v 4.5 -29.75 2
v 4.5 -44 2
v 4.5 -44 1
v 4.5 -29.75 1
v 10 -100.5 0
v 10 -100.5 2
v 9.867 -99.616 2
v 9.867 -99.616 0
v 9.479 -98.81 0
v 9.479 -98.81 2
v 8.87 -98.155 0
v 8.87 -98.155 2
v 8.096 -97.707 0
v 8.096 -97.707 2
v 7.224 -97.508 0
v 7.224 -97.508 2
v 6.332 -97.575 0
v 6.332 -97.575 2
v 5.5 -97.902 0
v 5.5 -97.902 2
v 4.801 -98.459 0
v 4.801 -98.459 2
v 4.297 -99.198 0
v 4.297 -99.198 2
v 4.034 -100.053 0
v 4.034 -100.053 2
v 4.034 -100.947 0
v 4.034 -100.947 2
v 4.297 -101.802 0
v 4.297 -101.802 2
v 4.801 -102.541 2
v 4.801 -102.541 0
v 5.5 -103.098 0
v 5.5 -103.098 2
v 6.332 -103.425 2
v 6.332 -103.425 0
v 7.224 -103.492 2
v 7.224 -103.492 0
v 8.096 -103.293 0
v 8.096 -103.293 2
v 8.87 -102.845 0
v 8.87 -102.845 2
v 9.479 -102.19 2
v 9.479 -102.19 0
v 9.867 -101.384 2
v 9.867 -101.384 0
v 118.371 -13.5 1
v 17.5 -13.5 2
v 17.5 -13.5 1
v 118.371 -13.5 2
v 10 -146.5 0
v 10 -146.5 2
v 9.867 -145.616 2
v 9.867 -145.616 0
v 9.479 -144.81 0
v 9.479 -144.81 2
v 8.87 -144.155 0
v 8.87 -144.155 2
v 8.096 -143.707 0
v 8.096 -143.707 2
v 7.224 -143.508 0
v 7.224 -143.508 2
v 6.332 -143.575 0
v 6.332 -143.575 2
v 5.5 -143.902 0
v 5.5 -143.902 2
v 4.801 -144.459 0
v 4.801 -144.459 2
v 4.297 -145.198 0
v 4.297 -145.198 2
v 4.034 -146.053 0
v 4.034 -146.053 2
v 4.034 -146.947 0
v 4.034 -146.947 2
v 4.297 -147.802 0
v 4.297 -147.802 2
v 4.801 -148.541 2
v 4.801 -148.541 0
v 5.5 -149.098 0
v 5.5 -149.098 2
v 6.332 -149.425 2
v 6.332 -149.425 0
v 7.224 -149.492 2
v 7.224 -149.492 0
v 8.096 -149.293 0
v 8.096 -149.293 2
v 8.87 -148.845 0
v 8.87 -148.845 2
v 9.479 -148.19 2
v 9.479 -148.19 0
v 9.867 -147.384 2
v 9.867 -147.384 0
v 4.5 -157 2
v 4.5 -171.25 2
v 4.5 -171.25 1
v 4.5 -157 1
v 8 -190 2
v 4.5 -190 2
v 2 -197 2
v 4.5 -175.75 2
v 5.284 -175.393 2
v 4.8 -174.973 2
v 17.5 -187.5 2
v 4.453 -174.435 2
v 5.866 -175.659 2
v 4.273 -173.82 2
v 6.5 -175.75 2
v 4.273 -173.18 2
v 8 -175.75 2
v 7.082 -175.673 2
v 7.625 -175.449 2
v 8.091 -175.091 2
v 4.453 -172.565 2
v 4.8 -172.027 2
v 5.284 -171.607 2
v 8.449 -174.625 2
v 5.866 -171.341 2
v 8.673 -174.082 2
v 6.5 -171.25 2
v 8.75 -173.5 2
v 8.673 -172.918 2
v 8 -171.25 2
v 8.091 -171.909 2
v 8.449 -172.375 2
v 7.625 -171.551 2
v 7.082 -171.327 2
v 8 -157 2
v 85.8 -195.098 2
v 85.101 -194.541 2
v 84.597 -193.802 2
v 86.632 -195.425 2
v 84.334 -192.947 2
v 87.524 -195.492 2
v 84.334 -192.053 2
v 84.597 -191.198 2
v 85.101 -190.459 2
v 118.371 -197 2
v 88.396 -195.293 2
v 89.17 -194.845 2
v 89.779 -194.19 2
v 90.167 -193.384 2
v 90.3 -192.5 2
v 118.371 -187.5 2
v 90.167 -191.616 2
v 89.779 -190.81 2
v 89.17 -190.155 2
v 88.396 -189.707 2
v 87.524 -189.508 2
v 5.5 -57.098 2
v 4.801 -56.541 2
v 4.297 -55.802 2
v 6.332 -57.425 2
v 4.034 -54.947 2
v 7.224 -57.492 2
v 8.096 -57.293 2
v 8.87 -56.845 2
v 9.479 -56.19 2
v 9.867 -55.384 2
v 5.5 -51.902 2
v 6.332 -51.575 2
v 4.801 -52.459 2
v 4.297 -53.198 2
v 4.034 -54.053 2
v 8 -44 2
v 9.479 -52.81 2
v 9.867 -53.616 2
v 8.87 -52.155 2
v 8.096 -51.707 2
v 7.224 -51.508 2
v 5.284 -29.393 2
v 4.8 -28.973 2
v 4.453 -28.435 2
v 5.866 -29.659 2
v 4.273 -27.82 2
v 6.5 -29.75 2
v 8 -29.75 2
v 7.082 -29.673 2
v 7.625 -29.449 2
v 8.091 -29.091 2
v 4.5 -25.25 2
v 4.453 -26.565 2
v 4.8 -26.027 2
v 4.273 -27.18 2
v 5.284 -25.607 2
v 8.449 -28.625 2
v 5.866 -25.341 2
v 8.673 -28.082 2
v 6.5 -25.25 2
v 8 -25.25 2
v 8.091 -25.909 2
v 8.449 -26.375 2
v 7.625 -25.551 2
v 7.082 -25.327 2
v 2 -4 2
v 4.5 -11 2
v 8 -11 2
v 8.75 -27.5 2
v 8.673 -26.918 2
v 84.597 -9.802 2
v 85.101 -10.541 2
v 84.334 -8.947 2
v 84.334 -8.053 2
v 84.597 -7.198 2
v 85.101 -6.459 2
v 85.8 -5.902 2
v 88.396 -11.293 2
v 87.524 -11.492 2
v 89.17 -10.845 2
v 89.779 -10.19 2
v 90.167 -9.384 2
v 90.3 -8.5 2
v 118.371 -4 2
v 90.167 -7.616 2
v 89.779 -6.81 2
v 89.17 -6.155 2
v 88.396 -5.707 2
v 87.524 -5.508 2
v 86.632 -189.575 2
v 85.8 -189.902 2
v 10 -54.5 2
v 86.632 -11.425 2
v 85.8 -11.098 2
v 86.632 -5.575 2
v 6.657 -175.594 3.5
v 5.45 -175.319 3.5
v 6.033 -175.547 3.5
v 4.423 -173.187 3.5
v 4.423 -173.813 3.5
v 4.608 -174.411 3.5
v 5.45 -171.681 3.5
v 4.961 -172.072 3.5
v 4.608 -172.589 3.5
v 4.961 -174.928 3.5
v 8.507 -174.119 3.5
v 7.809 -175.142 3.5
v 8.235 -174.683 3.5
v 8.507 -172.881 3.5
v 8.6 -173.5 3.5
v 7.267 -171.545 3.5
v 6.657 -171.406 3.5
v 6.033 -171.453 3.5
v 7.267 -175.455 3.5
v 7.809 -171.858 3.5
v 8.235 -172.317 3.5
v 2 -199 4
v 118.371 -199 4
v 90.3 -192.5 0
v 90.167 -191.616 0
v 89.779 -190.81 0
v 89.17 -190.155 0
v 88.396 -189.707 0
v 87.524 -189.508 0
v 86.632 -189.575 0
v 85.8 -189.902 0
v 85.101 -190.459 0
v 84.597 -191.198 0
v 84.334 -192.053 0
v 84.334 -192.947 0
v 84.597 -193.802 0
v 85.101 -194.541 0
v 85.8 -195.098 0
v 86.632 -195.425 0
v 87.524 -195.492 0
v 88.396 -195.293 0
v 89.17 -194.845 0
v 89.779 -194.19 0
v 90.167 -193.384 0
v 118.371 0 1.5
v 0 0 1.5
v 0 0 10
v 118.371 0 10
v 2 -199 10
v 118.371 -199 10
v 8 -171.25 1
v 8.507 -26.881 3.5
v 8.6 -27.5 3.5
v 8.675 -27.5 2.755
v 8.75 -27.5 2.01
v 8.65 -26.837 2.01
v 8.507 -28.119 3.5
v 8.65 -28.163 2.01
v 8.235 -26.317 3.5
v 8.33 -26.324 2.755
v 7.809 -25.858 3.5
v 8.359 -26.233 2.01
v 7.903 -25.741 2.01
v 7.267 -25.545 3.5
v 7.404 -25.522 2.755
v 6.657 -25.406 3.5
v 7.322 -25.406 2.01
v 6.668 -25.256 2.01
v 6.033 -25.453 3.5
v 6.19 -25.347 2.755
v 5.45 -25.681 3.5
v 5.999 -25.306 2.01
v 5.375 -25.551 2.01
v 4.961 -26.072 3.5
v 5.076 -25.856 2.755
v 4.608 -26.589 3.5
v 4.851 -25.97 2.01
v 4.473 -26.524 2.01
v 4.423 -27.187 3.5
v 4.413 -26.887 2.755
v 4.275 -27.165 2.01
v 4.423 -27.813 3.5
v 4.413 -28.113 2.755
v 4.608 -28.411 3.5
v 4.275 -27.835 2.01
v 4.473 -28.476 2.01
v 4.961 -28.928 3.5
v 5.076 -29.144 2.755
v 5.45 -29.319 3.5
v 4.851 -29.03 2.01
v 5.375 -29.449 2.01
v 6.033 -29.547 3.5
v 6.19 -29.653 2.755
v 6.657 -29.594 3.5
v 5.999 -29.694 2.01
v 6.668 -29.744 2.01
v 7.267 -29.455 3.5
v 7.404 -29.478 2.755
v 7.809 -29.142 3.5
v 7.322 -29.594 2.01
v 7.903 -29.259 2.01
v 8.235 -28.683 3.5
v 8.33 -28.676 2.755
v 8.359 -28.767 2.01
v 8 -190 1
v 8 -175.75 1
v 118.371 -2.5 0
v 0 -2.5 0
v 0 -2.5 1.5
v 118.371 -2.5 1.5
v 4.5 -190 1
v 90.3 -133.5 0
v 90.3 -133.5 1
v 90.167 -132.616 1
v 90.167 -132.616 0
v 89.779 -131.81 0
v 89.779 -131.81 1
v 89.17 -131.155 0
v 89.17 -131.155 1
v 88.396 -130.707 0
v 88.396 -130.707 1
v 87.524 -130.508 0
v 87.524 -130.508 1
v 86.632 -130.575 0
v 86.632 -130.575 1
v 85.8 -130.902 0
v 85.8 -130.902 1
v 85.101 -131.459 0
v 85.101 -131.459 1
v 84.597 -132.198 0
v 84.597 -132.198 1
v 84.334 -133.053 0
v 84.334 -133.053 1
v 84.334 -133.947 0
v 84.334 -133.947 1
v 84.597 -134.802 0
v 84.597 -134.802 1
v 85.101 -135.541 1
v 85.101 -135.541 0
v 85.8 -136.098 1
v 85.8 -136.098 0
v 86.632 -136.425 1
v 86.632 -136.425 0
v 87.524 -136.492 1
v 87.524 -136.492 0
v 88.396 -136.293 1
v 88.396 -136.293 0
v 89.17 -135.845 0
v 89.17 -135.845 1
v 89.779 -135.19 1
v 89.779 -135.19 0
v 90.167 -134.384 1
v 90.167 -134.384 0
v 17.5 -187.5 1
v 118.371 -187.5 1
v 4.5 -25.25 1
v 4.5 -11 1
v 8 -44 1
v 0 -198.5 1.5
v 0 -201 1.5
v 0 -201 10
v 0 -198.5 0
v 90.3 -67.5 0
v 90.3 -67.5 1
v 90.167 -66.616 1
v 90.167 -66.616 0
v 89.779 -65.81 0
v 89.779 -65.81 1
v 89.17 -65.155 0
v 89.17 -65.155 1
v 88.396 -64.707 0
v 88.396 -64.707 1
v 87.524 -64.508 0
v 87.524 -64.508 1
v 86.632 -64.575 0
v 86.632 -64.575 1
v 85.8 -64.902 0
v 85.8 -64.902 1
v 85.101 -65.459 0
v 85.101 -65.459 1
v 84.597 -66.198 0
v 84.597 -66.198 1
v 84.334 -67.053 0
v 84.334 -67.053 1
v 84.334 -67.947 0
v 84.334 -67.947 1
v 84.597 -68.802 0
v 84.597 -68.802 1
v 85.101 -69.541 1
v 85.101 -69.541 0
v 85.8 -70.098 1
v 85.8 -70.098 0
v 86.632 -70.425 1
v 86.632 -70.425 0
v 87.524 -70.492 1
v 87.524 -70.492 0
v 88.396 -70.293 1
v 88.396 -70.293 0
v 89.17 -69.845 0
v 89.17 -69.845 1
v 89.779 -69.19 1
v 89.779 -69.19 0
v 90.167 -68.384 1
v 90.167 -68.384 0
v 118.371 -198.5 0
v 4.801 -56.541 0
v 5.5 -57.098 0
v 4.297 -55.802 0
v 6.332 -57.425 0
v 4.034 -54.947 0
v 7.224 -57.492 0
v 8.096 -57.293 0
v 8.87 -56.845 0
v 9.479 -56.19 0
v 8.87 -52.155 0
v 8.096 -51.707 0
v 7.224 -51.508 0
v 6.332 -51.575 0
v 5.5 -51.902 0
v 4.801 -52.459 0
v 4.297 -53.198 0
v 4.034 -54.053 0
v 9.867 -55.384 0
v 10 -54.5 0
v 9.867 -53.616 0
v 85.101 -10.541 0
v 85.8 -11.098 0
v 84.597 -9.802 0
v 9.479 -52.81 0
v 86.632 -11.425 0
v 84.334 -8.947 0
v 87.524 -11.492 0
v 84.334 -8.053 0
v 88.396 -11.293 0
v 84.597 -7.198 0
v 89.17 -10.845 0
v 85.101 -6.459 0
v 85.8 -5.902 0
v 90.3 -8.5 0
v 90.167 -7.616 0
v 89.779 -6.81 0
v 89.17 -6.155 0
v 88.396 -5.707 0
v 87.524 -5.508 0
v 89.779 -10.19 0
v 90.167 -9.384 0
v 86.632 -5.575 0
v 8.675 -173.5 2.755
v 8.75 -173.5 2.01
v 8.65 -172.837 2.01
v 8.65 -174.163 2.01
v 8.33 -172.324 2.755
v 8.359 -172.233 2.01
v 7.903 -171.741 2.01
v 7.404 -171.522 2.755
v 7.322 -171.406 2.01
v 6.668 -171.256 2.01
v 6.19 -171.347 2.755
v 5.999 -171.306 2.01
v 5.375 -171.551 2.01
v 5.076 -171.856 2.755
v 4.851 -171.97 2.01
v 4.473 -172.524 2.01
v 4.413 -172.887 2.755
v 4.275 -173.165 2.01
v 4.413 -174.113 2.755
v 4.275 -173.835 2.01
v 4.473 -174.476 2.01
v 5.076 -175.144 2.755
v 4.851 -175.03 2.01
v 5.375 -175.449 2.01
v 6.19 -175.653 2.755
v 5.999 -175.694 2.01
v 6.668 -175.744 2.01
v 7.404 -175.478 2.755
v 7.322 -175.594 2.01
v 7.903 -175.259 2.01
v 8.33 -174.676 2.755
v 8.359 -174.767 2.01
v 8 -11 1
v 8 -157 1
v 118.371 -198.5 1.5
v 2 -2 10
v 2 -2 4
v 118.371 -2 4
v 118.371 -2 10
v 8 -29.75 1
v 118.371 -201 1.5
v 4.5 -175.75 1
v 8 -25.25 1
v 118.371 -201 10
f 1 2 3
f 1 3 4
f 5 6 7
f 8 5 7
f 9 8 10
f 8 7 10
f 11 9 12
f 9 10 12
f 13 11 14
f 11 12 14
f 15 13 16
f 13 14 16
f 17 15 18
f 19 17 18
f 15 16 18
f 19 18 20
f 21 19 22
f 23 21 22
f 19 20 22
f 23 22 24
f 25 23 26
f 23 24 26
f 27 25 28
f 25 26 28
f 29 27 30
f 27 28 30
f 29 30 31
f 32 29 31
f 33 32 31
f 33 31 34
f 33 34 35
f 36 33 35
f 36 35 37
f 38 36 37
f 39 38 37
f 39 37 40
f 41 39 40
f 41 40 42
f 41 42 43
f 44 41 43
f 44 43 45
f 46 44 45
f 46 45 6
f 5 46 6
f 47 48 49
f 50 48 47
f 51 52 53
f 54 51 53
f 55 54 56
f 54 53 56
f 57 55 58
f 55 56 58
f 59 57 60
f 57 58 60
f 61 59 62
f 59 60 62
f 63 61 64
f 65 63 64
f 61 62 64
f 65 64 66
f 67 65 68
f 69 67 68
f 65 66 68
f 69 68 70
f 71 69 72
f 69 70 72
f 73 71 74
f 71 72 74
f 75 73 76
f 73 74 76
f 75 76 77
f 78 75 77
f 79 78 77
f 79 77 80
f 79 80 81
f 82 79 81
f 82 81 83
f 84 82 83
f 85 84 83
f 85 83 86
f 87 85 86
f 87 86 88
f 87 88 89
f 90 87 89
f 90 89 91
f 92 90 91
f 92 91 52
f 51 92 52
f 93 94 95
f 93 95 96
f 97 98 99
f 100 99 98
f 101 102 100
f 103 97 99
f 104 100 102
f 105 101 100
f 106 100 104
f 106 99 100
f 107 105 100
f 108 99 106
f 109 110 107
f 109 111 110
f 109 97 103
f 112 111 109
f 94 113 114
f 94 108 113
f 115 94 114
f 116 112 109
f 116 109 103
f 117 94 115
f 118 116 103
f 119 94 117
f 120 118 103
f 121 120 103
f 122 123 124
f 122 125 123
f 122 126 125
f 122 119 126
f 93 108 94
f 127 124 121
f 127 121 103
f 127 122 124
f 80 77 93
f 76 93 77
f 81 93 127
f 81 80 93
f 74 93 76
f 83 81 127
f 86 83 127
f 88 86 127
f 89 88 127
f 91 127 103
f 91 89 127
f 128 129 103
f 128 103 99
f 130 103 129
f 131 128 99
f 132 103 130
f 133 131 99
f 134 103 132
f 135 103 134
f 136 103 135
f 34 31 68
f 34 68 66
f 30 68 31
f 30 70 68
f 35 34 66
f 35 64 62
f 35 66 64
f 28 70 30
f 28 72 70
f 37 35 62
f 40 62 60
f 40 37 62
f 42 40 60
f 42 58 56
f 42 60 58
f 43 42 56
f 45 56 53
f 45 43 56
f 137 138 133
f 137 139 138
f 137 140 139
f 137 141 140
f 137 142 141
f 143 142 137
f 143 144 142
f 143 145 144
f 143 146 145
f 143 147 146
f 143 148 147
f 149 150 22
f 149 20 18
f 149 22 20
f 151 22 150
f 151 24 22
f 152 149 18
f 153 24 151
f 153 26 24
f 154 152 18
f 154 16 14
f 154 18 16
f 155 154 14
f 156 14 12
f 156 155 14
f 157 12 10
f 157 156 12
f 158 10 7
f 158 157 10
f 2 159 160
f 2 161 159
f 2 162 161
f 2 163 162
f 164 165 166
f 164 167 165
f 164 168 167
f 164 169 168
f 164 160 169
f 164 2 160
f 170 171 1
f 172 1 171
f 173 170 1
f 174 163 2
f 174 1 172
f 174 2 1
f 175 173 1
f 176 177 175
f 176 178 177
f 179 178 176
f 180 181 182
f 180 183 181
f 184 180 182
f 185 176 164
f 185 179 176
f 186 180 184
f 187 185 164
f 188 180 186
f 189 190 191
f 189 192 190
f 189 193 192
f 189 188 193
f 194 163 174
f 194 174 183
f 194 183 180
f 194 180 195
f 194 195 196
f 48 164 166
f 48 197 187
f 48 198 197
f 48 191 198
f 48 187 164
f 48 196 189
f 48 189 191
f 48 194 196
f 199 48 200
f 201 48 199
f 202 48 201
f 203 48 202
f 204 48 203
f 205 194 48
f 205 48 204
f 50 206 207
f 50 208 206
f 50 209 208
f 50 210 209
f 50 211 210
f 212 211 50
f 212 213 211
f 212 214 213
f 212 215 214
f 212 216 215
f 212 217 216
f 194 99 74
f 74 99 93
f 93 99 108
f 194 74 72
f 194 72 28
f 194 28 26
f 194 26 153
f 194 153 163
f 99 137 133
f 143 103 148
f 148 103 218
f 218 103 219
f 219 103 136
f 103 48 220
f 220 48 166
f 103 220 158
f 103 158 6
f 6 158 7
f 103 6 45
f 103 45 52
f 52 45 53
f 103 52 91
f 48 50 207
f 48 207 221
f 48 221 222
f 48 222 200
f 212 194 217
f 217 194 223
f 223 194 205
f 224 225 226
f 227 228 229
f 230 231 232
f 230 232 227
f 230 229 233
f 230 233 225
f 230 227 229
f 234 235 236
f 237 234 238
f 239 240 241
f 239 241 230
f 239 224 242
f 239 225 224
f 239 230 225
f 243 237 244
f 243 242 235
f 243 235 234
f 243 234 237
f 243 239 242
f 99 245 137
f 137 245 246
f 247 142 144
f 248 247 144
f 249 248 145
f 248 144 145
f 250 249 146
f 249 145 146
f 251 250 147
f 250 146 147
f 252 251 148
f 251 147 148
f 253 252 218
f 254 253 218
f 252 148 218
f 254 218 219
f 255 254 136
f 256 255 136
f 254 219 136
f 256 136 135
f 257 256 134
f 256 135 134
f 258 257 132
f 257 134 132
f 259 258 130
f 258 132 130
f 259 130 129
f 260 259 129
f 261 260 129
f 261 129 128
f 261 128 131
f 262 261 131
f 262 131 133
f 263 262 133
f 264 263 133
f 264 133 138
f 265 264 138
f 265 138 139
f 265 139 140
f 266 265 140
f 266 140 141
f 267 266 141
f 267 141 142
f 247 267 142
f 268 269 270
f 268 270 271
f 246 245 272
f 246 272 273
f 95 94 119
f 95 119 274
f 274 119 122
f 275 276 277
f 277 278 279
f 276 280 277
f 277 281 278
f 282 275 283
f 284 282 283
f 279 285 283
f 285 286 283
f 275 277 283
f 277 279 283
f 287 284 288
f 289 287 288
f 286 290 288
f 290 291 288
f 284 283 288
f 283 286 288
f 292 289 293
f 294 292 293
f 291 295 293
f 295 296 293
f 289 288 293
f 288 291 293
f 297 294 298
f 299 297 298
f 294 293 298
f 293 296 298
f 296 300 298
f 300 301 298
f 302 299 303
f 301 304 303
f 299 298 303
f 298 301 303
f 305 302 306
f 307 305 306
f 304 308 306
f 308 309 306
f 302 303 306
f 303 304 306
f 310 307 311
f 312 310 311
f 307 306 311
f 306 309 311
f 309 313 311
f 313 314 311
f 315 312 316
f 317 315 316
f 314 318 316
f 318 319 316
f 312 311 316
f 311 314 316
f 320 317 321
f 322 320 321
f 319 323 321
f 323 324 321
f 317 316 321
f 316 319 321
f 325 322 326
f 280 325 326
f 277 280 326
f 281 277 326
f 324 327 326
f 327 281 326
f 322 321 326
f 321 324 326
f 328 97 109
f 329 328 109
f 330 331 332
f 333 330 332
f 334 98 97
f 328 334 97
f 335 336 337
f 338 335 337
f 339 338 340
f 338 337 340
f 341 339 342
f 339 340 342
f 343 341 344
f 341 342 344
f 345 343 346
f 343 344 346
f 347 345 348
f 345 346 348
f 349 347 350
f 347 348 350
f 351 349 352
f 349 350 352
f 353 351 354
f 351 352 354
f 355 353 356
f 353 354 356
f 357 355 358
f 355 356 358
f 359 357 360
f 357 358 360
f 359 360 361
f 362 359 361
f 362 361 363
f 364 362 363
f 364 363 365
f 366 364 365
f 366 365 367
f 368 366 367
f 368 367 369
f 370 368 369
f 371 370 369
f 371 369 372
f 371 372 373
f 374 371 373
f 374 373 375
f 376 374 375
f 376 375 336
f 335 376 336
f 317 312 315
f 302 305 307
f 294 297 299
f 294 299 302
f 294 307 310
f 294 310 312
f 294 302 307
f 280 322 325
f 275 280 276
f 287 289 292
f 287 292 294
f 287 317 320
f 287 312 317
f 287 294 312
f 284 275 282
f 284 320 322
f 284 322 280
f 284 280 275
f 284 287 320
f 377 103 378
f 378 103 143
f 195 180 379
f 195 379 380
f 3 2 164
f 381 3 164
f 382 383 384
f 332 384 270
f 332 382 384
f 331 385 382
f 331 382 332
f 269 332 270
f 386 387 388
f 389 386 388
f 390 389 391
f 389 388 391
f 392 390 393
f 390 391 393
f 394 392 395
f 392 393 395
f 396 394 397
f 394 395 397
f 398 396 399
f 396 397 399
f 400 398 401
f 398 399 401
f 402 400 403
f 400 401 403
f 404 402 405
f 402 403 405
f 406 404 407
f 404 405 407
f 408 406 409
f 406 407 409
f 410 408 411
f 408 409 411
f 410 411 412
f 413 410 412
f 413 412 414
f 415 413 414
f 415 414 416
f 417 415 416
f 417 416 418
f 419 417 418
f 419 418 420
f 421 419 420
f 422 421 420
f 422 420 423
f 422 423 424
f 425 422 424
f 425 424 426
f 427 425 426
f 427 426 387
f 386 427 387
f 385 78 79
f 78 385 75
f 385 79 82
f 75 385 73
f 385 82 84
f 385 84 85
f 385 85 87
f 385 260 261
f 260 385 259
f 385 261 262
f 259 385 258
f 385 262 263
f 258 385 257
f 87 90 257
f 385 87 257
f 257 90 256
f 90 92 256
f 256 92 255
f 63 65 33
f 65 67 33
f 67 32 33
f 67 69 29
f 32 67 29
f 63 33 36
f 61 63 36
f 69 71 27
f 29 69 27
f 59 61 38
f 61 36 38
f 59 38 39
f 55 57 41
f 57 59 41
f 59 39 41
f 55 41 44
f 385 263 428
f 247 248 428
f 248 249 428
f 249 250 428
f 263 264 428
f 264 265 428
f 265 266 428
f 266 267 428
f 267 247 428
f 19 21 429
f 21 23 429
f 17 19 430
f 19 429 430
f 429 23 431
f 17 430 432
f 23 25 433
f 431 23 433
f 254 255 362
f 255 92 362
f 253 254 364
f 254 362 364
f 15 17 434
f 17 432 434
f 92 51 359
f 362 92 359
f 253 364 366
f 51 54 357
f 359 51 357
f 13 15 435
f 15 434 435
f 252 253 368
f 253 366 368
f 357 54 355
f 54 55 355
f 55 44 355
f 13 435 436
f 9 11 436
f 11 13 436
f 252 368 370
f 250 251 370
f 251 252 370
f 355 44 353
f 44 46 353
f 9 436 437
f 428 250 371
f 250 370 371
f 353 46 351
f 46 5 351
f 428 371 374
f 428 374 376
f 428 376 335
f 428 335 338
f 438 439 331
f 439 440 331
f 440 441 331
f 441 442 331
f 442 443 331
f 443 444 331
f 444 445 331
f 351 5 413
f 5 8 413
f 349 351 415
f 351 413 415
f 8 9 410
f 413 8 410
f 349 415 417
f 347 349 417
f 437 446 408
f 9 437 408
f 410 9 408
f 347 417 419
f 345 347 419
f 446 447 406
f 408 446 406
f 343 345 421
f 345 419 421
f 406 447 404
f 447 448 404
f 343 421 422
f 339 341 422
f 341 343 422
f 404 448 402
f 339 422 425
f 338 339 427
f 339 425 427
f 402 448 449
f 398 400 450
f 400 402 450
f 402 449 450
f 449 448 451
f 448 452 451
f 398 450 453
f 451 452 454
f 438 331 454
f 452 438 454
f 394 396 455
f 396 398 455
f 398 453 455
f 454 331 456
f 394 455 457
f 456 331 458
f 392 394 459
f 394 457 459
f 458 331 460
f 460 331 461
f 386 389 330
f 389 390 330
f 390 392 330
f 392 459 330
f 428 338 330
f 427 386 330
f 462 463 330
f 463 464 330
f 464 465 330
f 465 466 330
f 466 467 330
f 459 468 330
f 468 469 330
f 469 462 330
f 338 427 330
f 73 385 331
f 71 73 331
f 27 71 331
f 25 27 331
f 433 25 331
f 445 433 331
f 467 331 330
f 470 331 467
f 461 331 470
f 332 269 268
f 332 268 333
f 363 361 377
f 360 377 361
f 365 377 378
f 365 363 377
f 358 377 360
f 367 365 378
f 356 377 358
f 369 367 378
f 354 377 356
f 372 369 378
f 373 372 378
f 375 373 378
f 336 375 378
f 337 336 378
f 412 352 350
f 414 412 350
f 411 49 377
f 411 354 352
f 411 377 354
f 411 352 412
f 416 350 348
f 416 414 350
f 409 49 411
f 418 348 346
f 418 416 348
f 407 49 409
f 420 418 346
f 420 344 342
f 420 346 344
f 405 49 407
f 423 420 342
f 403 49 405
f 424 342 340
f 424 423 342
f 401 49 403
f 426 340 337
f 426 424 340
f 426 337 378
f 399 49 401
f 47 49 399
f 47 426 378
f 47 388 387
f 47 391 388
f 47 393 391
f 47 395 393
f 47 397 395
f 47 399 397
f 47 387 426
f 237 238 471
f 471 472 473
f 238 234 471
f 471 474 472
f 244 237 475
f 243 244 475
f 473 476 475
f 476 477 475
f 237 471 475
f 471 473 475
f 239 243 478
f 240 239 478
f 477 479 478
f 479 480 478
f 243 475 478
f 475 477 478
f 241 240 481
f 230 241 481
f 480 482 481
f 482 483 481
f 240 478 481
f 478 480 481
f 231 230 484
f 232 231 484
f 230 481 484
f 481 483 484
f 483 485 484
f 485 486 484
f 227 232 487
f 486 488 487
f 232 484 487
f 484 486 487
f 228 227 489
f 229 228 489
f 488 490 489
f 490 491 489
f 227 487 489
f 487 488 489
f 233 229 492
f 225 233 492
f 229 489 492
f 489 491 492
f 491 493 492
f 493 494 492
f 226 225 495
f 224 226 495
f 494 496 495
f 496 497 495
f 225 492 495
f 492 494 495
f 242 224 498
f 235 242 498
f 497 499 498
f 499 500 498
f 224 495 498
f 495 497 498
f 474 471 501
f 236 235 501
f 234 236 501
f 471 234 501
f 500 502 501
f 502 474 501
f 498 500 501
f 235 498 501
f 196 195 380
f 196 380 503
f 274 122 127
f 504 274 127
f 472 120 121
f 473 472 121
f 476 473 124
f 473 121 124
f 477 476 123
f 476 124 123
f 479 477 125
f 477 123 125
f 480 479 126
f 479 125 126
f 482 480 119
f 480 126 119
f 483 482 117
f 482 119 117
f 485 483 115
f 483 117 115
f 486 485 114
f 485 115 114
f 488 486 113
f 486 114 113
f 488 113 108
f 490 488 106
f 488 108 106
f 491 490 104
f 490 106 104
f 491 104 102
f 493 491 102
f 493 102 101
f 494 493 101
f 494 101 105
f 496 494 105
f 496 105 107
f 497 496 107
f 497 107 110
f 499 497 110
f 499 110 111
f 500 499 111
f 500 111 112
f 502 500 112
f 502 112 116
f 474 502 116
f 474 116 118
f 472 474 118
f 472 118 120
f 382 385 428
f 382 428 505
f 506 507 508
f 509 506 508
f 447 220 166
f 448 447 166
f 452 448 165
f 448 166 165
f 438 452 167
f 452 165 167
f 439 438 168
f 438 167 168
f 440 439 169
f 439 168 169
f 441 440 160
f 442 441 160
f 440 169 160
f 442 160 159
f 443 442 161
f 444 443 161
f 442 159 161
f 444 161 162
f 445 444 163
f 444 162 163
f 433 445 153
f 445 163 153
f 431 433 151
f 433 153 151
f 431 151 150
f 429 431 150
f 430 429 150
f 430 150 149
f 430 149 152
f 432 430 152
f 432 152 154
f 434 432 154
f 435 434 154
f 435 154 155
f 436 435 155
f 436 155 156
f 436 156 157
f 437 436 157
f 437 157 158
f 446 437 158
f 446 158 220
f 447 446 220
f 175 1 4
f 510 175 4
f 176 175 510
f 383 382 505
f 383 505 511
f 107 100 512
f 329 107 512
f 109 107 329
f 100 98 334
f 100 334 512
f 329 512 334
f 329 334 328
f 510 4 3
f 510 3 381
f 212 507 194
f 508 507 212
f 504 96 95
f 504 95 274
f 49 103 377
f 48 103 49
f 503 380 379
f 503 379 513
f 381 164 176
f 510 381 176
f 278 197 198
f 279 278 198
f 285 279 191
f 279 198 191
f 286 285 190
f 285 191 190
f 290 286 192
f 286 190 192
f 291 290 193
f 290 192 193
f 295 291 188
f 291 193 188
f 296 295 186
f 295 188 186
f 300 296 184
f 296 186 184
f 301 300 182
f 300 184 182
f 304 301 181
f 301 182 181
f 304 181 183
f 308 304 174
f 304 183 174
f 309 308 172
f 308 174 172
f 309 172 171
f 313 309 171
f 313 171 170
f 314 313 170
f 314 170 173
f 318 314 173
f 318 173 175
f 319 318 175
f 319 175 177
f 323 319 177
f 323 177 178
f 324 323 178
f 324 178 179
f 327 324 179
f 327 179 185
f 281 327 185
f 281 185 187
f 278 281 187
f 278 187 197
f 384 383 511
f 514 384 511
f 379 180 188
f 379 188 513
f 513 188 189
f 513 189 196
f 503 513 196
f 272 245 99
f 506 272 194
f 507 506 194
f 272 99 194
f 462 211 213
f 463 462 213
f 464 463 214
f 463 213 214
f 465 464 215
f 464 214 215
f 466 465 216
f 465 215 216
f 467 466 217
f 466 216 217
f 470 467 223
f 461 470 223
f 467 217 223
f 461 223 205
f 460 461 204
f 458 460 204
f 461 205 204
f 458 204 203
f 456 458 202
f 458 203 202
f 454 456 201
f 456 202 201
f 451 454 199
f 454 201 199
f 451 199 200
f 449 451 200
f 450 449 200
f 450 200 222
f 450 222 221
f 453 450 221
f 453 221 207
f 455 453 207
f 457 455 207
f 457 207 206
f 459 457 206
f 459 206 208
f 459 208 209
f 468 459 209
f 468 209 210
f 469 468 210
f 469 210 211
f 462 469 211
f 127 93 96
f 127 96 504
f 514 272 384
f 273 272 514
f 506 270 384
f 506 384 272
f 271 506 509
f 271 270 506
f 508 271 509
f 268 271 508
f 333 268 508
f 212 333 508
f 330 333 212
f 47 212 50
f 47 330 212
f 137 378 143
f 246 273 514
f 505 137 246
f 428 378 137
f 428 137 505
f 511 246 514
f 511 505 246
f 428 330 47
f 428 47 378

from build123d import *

# Parameters (mm, degrees)
F0_W        = 245
F0_H        = 201
F1_DEPTH    = 8
F2_T        = -2
F3_W        = 210
F3_H        = 174
F4_DEPTH    = 1
F5_W        = 3.5
F5_H        = 33
F6_DEPTH    = 1
F8_W        = 3.5
F8_H        = 4.5
F9_DEPTH    = 1
F10_R       = 2.25
F11_DEPTH   = 1.5
F12_SIZE2   = 1.4896513151
F12_SIZE    = 0.15
F12_2_SIZE2 = 1.4896513151
F12_2_SIZE  = 0.15
F12_3_SIZE2 = 1.4896513151
F12_3_SIZE  = 0.15
F12_4_SIZE2 = 1.4896513151
F12_4_SIZE  = 0.15
F12_5_SIZE2 = 1.4896513151
F12_5_SIZE  = 0.15
F13_R       = 3
F14_DEPTH   = 2.001
F15_W       = 2.5
F15_H       = 1.5
F16_DEPTH   = 245.001
F17_SIZE    = 2
F18_DEPTH   = 2
F19_W       = 186.7508292198
F19_H       = 249.5966032147
F20_DEPTH   = 10.001


with BuildPart() as f1:
    # F0 (on Top) → F1 (new body)
    with BuildSketch(Plane.XY):
        with Locations((122.5, -100.5)):
            Rectangle(F0_W, F0_H)
    extrude(amount=F1_DEPTH)

    # F2
    f2_openings = [f1.faces().sort_by_distance(p)[0] for p in [
        (122.5, -100.5, 8),
    ]]
    offset(amount=F2_T, openings=f2_openings)

    # F3 (on face) → F4 (cut)
    with BuildSketch(Plane.XY.offset(2)):
        with Locations((122.5, -100.5)):
            Rectangle(F3_W, F3_H)
    extrude(amount=-F4_DEPTH, mode=Mode.SUBTRACT)

    # F5 (on face) → F6 (cut)
    with BuildSketch(Plane.XY.offset(2)):
        with Locations((6.25, -27.5)):
            Rectangle(F5_W, F5_H)
        with Locations((6.25, -173.5)):
            Rectangle(F5_W, F5_H)
        with Locations((238.75, -27.5)):
            Rectangle(F5_W, F5_H)
        with Locations((238.75, -173.5)):
            Rectangle(F5_W, F5_H)
    extrude(amount=-F6_DEPTH, mode=Mode.SUBTRACT)

    # F8 (on face) → F9 (join)
    with BuildSketch(Plane.XY.offset(2)):
        with Locations((238.75, -173.5)):
            Rectangle(F8_W, F8_H)
        with Locations((238.75, -27.5)):
            Rectangle(F8_W, F8_H)
        with Locations((6.25, -27.5)):
            Rectangle(F8_W, F8_H)
        with Locations((6.25, -173.5)):
            Rectangle(F8_W, F8_H)
    extrude(amount=-F9_DEPTH)

    # F10 (on face) → F11 (join)
    with BuildSketch(Plane.XY.offset(2)):
        with Locations((238.5, -27.5)):
            Circle(F10_R)
        with Locations((6.5, -27.5)):
            Circle(F10_R)
        with Locations((6.5, -173.5)):
            Circle(F10_R)
        with Locations((238.5, -173.5)):
            Circle(F10_R)
        with Locations((122.5, -8.5)):
            Circle(F10_R)
    extrude(amount=F11_DEPTH)

    # F12
    f12_edges = [f1.edges().sort_by_distance(p)[0] for p in [
        (236.25, -173.5, 3.5),
    ]]
    f12_side = f1.faces().sort_by_distance((238.5, -173.5, 3.5))[0]
    chamfer(f12_edges, length=F12_SIZE, length2=F12_SIZE2, reference=f12_side)

    # F12#2
    f12_2_edges = [f1.edges().sort_by_distance(p)[0] for p in [
        (4.25, -173.5, 3.5),
    ]]
    f12_2_side = f1.faces().sort_by_distance((6.5, -173.5, 3.5))[0]
    chamfer(f12_2_edges, length=F12_2_SIZE, length2=F12_2_SIZE2, reference=f12_2_side)

    # F12#3
    f12_3_edges = [f1.edges().sort_by_distance(p)[0] for p in [
        (236.25, -27.5, 3.5),
    ]]
    f12_3_side = f1.faces().sort_by_distance((238.5, -27.5, 3.5))[0]
    chamfer(f12_3_edges, length=F12_3_SIZE, length2=F12_3_SIZE2, reference=f12_3_side)

    # F12#4
    f12_4_edges = [f1.edges().sort_by_distance(p)[0] for p in [
        (4.25, -27.5, 3.5),
    ]]
    f12_4_side = f1.faces().sort_by_distance((6.5, -27.5, 3.5))[0]
    chamfer(f12_4_edges, length=F12_4_SIZE, length2=F12_4_SIZE2, reference=f12_4_side)

    # F12#5
    f12_5_edges = [f1.edges().sort_by_distance(p)[0] for p in [
        (120.25, -8.5, 3.5),
    ]]
    f12_5_side = f1.faces().sort_by_distance((122.5, -8.5, 3.5))[0]
    chamfer(f12_5_edges, length=F12_5_SIZE, length2=F12_5_SIZE2, reference=f12_5_side)

    # F13 (on face) → F14 (cut, through all)
    with BuildSketch(Plane.XY.offset(2)):
        with Locations((7, -54.5)):
            Circle(F13_R)
        with Locations((7, -100.5)):
            Circle(F13_R)
        with Locations((7, -146.5)):
            Circle(F13_R)
        with Locations((238, -54.5)):
            Circle(F13_R)
        with Locations((238, -100.5)):
            Circle(F13_R)
        with Locations((238, -146.5)):
            Circle(F13_R)
        with Locations((87.3, -8.5)):
            Circle(F13_R)
        with Locations((87.3, -67.5)):
            Circle(F13_R)
        with Locations((157.7, -8.5)):
            Circle(F13_R)
        with Locations((157.7, -67.5)):
            Circle(F13_R)
        with Locations((157.7, -133.5)):
            Circle(F13_R)
        with Locations((157.7, -192.5)):
            Circle(F13_R)
        with Locations((87.3, -192.5)):
            Circle(F13_R)
        with Locations((87.3, -133.5)):
            Circle(F13_R)
    extrude(amount=-F14_DEPTH, mode=Mode.SUBTRACT)

    # F15 (on face) → F16 (cut, through all)
    with BuildSketch(Plane(origin=(0, 0, 0), x_dir=(0, -1, 0), z_dir=(-1, 0, 0))):
        with Locations((1.25, 0.75)):
            Rectangle(F15_W, F15_H)
        with Locations((199.75, 0.75)):
            Rectangle(F15_W, F15_H)
    extrude(amount=-F16_DEPTH, mode=Mode.SUBTRACT)

    # F17
    f17_edges = [f1.edges().sort_by_distance(p)[0] for p in [
        (122.5, -2, 2),
        (122.5, -199, 2),
    ]]
    chamfer(f17_edges, length=F17_SIZE)

    # F18 (add): a face of the model
    f18_faces = [f1.faces().sort_by_distance(p)[0] for p in [
        (122.5, -0.3169006153, 8),
    ]]
    extrude(f18_faces, amount=F18_DEPTH)

    # F19 (on face) → F20 (cut, through all)
    with BuildSketch(Plane(origin=(0, 0, 0), x_dir=(1, 0, 0), z_dir=(0, 0, -1))):
        with Locations((211.746044457, 104.012247175)):
            Rectangle(F19_W, F19_H)
    extrude(amount=-F20_DEPTH, mode=Mode.SUBTRACT)


solid = f1.part
